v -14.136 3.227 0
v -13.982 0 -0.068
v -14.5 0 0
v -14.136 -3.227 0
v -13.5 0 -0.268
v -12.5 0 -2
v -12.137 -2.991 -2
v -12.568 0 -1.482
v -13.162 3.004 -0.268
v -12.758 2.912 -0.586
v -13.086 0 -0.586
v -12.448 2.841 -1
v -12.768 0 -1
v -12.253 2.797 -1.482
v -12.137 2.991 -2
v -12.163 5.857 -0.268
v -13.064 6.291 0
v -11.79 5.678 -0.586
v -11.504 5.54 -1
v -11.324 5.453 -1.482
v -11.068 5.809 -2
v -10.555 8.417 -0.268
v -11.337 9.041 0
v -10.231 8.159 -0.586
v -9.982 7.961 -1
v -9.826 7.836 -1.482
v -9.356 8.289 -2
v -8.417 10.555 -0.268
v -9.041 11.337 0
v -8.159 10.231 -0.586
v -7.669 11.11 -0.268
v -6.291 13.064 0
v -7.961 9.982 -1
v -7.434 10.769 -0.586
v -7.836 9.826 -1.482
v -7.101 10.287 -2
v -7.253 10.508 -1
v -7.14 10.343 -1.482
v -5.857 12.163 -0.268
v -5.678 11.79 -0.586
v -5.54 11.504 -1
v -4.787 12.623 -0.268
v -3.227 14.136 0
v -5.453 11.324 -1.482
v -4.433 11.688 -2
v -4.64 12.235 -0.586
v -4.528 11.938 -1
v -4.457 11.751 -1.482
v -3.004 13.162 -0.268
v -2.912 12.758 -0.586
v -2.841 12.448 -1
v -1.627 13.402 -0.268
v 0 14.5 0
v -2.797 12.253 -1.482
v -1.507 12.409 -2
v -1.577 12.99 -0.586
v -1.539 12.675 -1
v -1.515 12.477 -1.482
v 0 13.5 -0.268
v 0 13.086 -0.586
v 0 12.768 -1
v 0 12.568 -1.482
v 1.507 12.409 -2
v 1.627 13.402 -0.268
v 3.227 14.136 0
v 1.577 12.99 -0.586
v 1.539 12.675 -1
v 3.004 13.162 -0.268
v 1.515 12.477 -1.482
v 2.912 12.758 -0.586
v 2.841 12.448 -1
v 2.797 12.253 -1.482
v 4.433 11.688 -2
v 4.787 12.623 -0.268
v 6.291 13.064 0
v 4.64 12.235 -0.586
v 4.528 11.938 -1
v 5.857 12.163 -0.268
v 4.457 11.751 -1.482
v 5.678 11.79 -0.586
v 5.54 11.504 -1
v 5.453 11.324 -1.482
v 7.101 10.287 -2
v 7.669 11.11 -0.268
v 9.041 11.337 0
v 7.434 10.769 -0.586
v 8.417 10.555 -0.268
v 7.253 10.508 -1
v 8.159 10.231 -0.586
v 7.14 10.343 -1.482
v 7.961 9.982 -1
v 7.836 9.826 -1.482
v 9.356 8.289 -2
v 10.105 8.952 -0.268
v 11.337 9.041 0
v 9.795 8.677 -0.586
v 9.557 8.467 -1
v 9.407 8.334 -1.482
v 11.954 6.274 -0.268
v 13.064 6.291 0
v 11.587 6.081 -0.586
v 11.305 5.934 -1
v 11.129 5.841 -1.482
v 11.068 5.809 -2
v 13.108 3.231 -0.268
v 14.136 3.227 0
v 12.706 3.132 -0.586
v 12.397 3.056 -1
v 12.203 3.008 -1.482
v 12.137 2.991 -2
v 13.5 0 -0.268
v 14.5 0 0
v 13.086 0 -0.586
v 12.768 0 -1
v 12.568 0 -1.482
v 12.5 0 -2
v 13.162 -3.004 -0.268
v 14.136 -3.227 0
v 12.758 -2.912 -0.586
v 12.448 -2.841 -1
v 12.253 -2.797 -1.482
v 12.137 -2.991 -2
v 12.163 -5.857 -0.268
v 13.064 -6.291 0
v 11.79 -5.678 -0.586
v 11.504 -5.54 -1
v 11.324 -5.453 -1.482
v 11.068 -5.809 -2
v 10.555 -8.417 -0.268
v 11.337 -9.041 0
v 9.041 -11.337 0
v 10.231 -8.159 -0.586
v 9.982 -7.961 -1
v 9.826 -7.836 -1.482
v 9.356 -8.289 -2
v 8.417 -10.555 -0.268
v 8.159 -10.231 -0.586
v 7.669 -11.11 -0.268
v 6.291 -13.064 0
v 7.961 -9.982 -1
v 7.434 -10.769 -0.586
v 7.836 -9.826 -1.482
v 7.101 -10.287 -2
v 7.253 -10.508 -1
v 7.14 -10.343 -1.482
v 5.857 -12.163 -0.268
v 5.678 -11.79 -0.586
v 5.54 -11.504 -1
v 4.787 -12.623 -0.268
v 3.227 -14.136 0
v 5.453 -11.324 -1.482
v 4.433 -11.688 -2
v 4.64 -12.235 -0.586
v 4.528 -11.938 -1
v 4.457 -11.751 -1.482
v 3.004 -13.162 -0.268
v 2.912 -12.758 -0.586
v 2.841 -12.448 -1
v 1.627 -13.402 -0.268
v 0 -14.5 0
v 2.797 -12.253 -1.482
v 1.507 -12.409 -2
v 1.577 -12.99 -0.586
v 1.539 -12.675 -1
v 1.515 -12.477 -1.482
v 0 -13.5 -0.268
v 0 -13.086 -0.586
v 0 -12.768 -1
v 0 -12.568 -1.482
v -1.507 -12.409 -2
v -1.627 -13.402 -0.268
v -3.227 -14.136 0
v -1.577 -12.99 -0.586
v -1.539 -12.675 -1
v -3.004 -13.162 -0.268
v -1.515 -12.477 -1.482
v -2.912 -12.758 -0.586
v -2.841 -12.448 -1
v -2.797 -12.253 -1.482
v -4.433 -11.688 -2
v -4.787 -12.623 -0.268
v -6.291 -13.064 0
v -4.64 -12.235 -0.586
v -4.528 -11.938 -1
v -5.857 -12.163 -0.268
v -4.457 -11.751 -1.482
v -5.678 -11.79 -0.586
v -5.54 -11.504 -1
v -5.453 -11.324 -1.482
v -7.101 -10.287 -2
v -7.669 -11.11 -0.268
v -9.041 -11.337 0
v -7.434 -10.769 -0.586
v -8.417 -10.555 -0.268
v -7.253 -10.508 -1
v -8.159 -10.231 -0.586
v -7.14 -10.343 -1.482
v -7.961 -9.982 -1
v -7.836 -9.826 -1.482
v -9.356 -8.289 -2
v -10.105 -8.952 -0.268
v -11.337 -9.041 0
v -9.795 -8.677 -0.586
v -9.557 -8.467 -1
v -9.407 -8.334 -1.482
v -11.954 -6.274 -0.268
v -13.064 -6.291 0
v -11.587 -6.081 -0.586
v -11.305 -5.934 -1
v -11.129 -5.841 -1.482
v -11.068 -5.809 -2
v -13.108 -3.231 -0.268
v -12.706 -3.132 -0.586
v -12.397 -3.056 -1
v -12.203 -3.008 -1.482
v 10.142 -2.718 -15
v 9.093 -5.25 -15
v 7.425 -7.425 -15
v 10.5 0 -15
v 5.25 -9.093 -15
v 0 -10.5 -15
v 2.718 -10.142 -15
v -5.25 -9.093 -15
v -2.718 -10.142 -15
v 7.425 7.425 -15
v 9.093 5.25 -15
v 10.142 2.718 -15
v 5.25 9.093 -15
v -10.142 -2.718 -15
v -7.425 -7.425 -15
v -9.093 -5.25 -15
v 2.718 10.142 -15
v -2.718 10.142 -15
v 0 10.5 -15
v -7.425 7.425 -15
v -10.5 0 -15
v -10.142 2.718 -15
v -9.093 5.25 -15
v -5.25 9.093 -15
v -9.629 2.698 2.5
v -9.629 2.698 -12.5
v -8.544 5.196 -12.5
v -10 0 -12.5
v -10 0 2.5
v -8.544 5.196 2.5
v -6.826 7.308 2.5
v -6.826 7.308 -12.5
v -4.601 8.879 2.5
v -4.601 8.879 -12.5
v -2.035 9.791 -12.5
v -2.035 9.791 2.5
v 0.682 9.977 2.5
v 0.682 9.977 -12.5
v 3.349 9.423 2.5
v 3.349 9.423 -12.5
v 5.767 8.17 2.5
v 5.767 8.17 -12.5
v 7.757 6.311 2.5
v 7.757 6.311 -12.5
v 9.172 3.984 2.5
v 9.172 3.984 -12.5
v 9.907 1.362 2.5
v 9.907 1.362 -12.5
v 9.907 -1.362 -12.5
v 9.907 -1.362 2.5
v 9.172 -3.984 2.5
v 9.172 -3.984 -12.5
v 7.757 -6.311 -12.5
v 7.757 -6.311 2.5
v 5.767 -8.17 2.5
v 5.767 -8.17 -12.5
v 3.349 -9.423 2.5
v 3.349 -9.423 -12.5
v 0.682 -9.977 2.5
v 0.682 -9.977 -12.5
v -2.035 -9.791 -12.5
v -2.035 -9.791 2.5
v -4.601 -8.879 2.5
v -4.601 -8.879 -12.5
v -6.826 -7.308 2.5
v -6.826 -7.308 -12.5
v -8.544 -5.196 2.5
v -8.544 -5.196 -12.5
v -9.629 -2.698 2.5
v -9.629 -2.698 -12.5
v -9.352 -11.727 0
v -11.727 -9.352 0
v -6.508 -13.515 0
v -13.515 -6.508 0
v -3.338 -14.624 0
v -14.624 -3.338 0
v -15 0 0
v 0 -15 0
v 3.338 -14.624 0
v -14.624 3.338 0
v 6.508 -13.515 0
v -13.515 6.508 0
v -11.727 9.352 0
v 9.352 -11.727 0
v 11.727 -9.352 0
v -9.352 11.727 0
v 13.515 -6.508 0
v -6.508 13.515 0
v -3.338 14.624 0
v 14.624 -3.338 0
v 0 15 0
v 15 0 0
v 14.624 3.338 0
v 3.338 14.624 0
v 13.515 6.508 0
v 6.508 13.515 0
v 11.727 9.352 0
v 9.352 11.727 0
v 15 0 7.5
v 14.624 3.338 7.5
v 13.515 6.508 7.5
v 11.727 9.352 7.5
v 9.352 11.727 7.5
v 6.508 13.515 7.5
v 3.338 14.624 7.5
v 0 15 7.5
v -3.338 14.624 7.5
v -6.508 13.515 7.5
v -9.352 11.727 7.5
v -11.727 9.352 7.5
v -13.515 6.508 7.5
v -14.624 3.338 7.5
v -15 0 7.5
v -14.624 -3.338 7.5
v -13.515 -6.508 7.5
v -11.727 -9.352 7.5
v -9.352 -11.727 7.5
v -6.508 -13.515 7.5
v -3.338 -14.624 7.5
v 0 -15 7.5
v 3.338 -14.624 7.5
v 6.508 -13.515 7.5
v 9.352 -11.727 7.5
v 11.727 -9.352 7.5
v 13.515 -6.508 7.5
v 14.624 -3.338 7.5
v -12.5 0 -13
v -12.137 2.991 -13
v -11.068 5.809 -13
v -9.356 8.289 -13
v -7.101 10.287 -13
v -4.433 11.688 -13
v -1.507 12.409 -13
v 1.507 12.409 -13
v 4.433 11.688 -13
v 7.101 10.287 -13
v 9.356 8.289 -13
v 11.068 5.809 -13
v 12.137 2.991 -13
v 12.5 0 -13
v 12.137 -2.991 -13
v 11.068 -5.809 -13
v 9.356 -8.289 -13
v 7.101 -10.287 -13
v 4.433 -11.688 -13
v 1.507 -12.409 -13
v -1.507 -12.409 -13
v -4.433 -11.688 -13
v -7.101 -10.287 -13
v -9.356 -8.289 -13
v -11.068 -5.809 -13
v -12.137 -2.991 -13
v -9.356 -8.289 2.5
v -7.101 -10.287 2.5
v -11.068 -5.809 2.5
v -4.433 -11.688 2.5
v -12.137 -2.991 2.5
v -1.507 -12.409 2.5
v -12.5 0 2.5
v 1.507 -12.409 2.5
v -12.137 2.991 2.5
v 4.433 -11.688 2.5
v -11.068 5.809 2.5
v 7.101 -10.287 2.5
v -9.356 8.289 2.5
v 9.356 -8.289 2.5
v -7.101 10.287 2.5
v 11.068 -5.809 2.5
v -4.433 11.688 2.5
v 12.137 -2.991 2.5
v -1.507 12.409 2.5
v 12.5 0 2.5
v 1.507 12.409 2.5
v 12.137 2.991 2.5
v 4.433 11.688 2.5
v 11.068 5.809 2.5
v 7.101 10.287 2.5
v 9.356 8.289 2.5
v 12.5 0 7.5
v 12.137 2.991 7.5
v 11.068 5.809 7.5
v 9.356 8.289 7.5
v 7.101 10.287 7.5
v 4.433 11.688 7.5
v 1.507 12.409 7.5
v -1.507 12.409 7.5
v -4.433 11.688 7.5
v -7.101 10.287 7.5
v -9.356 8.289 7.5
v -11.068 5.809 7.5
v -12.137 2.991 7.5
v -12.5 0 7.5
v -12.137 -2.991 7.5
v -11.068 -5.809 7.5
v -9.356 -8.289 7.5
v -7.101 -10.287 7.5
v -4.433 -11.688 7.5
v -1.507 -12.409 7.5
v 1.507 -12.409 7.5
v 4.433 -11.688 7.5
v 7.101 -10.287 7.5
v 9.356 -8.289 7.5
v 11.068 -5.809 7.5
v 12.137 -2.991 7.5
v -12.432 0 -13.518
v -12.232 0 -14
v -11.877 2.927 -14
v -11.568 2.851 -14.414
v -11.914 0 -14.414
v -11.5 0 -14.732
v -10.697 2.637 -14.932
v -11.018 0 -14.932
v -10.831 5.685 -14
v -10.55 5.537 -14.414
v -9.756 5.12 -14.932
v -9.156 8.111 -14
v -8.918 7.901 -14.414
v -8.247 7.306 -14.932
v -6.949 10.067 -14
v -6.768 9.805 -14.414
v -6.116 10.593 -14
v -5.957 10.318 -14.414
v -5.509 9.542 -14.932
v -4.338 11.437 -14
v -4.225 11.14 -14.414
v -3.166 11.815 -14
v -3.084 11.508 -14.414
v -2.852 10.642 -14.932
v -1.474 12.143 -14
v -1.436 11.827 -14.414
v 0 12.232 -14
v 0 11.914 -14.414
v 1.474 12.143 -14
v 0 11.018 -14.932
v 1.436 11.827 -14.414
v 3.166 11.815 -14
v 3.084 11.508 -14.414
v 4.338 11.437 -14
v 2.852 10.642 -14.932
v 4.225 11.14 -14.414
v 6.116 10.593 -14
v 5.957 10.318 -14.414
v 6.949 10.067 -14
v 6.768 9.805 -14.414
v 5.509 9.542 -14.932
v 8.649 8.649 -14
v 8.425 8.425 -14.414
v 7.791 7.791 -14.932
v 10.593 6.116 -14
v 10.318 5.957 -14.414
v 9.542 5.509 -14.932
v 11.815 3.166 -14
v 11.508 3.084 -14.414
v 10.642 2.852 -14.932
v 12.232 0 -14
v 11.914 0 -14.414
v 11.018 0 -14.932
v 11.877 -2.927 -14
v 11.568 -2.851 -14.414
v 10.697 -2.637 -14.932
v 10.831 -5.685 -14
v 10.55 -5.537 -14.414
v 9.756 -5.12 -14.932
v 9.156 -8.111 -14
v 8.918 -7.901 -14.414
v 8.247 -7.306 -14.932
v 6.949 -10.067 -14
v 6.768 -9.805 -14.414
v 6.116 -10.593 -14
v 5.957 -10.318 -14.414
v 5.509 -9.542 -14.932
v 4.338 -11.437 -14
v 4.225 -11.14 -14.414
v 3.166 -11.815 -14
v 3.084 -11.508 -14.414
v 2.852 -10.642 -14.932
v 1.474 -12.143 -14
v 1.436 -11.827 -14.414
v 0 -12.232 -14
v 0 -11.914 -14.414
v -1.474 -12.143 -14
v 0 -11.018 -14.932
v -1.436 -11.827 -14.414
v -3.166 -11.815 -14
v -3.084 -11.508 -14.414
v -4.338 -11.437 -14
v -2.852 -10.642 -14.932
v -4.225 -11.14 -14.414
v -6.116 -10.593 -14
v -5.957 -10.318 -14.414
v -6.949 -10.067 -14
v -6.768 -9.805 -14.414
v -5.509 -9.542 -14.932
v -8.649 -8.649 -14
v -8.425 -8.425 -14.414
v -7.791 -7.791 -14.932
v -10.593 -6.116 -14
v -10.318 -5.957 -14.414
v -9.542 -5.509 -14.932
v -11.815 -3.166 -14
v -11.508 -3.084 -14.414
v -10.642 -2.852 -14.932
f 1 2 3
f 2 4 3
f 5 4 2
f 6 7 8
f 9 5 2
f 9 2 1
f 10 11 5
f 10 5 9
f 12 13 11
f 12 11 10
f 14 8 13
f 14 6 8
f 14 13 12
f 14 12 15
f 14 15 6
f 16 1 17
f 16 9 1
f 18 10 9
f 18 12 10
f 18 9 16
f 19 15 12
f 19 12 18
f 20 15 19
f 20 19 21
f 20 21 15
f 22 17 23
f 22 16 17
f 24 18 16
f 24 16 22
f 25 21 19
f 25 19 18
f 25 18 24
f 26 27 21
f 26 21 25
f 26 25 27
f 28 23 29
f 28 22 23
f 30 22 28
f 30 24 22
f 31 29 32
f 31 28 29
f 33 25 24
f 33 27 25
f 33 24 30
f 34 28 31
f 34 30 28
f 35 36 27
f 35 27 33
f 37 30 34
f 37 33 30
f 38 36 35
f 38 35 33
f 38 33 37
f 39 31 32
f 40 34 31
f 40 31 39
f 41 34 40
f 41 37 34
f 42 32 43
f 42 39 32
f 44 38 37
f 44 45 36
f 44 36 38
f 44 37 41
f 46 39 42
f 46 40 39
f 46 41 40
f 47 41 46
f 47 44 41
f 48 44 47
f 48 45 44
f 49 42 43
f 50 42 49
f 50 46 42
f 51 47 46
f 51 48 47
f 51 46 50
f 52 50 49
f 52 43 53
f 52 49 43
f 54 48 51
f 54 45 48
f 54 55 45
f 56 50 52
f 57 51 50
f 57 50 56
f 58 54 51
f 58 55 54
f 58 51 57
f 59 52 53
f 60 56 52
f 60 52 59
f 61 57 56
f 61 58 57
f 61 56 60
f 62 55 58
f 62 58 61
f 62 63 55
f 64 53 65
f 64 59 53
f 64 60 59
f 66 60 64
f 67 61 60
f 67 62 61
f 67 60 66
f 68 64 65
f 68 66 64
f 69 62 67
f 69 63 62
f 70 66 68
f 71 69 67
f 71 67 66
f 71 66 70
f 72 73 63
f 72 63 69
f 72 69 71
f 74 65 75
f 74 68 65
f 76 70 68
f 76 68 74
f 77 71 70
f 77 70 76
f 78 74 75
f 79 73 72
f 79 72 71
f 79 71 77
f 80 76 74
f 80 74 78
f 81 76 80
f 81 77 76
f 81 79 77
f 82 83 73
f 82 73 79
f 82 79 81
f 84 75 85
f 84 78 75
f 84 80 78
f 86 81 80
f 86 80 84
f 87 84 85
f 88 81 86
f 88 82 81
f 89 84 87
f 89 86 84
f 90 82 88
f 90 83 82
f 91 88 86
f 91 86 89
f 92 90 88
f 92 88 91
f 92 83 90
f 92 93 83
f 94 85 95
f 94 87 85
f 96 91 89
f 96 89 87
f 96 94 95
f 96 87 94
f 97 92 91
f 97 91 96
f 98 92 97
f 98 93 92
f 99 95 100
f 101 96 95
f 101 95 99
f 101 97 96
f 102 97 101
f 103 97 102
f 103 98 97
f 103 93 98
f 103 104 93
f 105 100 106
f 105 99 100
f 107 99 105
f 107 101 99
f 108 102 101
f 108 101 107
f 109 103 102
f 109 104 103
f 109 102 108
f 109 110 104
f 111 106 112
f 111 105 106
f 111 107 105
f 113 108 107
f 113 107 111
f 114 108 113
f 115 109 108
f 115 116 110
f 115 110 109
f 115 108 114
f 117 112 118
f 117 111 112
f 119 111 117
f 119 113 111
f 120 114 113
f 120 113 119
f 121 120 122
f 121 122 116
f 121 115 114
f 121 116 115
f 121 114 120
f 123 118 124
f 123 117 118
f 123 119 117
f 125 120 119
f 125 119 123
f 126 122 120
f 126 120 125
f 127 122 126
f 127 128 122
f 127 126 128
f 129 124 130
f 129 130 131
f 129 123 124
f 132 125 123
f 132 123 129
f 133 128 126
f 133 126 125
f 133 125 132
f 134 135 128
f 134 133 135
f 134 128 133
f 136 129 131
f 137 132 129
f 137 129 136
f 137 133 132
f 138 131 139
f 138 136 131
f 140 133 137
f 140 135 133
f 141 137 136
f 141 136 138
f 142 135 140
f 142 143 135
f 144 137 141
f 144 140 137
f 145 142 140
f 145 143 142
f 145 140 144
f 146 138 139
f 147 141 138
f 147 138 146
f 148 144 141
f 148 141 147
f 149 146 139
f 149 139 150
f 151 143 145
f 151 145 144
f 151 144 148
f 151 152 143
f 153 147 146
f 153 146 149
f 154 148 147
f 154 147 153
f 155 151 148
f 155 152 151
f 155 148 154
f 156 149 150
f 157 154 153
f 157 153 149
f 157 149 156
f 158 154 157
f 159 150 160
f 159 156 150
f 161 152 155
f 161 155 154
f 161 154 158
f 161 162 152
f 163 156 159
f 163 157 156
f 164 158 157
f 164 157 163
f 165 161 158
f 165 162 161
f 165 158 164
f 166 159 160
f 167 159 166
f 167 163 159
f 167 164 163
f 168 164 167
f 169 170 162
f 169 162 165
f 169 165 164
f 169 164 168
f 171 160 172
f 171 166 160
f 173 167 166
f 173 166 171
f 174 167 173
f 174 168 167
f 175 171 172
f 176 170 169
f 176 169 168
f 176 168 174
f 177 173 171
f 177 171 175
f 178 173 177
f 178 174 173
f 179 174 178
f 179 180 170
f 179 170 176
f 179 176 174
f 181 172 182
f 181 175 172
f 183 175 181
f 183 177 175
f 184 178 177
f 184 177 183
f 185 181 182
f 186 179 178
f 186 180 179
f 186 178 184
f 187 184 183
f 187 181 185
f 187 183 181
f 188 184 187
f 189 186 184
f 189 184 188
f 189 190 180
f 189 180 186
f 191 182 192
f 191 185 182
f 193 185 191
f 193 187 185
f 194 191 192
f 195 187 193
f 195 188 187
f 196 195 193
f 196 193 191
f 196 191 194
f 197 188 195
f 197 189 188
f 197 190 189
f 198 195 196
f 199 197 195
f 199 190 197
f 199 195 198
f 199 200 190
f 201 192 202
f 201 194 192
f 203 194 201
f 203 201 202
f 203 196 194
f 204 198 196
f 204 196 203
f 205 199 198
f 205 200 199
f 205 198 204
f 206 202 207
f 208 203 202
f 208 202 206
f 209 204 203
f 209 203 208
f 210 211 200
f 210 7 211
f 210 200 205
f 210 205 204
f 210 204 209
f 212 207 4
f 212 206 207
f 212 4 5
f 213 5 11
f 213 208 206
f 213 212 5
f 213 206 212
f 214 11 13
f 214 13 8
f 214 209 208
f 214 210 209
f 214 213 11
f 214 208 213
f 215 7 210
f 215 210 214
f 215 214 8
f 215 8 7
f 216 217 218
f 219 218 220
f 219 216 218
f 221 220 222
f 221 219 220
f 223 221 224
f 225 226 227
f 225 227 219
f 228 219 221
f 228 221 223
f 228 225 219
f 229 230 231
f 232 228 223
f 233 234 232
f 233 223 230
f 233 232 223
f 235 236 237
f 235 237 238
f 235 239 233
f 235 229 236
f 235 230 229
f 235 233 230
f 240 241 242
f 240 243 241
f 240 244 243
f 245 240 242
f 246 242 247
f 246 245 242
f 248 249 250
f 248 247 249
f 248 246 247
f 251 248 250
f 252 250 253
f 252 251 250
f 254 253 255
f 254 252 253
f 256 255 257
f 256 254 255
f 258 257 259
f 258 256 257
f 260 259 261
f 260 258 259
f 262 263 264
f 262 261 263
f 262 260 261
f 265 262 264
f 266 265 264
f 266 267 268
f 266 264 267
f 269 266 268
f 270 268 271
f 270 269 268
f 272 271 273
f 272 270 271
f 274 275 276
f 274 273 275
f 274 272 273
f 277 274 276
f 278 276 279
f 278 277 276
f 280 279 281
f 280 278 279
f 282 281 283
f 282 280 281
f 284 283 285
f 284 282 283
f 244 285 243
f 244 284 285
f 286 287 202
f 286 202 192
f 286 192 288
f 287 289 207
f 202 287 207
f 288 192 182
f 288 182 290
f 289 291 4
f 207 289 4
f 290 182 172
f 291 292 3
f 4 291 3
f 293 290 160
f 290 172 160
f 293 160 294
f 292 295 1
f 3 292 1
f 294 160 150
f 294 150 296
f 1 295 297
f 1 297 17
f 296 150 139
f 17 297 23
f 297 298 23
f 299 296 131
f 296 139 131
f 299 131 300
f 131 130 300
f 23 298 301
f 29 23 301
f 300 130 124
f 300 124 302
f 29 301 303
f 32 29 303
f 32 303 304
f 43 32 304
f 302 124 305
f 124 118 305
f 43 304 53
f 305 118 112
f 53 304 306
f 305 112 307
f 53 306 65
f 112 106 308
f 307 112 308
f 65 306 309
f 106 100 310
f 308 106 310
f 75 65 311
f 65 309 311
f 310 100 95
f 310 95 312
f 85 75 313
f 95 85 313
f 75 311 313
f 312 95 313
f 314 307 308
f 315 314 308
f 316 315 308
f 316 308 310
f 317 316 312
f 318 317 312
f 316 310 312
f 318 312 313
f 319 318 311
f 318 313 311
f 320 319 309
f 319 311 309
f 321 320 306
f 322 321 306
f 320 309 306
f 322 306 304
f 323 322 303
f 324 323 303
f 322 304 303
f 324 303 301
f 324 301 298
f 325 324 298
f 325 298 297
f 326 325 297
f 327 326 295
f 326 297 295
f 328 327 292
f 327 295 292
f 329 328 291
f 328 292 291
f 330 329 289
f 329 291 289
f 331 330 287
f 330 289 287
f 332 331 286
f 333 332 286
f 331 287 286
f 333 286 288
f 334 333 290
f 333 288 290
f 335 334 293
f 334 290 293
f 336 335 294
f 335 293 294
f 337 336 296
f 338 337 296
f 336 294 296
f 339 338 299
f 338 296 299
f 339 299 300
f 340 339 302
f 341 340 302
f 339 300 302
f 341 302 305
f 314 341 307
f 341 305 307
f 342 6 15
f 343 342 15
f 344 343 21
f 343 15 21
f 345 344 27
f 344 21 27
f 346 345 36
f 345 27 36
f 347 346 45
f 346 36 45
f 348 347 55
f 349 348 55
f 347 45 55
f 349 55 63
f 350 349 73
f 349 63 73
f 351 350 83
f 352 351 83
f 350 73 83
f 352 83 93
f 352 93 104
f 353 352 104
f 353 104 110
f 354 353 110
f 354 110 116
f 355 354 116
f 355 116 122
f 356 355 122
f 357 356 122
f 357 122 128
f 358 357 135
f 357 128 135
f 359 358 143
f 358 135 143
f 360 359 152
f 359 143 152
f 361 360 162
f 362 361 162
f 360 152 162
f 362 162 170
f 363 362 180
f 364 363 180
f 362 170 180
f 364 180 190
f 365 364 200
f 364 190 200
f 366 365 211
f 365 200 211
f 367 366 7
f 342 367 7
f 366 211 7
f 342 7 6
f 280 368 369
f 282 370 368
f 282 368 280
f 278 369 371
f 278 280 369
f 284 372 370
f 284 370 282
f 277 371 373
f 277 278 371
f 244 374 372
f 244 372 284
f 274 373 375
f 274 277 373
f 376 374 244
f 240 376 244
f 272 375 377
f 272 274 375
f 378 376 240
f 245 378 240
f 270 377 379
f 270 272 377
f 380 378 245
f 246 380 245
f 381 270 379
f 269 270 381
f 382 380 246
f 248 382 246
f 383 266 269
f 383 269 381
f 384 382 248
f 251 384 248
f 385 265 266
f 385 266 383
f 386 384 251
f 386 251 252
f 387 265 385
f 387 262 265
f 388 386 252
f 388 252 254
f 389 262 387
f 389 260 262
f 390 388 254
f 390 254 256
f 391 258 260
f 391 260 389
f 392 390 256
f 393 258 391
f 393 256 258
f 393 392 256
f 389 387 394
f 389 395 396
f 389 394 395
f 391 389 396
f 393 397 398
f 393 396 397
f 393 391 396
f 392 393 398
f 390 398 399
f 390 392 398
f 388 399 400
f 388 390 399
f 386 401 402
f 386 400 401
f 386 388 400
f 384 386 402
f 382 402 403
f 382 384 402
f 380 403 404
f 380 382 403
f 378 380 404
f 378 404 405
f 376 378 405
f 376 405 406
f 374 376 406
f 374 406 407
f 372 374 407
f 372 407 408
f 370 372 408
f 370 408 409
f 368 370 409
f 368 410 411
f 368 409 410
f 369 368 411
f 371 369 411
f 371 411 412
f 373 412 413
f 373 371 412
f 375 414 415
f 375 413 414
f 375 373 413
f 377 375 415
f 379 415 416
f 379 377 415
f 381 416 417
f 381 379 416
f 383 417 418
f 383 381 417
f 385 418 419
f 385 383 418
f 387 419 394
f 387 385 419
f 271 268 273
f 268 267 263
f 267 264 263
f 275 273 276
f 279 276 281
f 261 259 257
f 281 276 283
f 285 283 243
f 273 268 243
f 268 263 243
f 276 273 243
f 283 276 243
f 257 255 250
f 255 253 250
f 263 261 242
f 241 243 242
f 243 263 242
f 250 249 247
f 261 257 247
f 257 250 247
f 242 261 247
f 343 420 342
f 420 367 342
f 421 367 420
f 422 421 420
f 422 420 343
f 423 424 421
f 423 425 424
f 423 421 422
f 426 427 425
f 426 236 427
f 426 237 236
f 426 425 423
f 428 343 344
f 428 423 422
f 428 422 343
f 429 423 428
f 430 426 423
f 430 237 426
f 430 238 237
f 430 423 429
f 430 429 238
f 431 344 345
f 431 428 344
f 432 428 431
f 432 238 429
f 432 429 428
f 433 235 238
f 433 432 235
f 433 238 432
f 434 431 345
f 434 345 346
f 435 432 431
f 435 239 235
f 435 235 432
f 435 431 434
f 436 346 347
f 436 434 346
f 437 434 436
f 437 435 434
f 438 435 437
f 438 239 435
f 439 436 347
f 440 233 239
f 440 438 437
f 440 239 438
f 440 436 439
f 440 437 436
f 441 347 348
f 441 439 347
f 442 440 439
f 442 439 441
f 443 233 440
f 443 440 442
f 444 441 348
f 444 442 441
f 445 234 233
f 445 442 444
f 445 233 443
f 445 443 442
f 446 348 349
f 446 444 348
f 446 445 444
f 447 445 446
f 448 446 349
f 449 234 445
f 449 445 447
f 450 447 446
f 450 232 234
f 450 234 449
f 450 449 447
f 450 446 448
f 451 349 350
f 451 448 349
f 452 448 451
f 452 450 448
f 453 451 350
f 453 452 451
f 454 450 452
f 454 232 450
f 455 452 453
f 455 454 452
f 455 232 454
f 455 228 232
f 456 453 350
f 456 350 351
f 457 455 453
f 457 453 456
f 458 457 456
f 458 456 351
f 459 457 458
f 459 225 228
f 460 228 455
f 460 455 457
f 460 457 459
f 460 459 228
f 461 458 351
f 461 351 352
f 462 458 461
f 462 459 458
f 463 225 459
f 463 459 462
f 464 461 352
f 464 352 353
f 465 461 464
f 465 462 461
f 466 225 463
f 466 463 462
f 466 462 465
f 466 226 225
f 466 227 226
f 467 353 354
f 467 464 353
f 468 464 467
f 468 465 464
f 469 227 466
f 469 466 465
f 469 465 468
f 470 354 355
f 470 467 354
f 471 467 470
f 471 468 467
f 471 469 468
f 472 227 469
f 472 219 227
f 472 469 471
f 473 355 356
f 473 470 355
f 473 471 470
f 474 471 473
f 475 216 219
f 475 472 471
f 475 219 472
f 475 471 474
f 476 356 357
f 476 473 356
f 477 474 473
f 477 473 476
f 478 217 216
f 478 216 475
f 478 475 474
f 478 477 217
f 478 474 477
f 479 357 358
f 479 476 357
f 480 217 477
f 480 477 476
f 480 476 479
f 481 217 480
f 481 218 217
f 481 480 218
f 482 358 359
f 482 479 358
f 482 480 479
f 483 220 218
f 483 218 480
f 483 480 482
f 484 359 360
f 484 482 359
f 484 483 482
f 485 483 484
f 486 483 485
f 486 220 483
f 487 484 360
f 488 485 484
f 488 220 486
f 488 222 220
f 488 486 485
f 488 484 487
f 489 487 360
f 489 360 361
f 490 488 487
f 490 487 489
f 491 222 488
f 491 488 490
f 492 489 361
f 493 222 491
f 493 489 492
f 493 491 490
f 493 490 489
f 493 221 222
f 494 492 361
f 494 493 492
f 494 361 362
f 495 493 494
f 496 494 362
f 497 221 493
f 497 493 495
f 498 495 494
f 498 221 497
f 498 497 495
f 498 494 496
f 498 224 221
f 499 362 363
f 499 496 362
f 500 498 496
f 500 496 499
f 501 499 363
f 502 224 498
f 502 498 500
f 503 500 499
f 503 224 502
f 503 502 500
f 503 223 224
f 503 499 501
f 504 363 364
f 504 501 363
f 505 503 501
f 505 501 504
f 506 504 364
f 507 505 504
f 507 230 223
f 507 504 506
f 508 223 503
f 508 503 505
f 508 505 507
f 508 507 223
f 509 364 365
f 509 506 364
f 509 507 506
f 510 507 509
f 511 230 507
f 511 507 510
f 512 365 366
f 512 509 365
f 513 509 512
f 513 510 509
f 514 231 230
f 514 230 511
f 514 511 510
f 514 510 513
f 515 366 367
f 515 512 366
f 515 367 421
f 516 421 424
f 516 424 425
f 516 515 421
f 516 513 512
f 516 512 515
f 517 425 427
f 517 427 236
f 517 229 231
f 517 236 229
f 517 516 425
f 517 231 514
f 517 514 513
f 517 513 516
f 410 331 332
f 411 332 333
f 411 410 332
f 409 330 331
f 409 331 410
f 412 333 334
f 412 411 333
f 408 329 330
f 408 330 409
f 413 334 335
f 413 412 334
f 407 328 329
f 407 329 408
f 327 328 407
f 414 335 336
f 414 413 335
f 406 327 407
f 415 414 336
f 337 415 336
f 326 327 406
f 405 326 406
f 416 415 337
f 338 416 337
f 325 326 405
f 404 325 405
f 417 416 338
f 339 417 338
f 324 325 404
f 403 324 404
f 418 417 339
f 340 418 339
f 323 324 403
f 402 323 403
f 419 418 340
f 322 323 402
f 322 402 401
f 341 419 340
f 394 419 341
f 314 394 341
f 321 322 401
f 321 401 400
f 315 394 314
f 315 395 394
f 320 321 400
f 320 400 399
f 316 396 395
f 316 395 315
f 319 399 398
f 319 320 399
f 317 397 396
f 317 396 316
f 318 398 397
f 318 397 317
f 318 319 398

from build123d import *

# Parameters (mm, degrees)
ESBO_O1_R                = 15
RESSALTO_EXTRUS_O1_DEPTH = 7.5
ESBO_O2_R                = 12.5
RESSALTO_EXTRUS_O2_DEPTH = 15
CASCA1_T                 = -2.5
FILETE2_R                = 2


with BuildPart() as part:
    # Esboço1 → Ressalto-extrusão1 (new body)
    with BuildSketch(Plane.XY):
        Circle(ESBO_O1_R)
    extrude(amount=RESSALTO_EXTRUS_O1_DEPTH)

    # Esboço2 → Ressalto-extrusão2 (add)
    with BuildSketch(Plane(origin=(0, 0, 0), x_dir=(-1, 0, 0), z_dir=(0, 0, -1))):
        Circle(ESBO_O2_R)
    extrude(amount=RESSALTO_EXTRUS_O2_DEPTH)

    # Casca1
    casca1_openings = [part.faces().sort_by_distance(p)[0] for p in [
        (0, 0, 7.5),
    ]]
    offset(amount=CASCA1_T, openings=casca1_openings, kind=Kind.INTERSECTION)

    # Filete2
    filete2_edges = [part.edges().sort_by_distance(p)[0] for p in [
        (12.5, 0, 0),
        (12.5, 0, -15),
    ]]
    fillet(filete2_edges, radius=FILETE2_R)


solid = part.part
